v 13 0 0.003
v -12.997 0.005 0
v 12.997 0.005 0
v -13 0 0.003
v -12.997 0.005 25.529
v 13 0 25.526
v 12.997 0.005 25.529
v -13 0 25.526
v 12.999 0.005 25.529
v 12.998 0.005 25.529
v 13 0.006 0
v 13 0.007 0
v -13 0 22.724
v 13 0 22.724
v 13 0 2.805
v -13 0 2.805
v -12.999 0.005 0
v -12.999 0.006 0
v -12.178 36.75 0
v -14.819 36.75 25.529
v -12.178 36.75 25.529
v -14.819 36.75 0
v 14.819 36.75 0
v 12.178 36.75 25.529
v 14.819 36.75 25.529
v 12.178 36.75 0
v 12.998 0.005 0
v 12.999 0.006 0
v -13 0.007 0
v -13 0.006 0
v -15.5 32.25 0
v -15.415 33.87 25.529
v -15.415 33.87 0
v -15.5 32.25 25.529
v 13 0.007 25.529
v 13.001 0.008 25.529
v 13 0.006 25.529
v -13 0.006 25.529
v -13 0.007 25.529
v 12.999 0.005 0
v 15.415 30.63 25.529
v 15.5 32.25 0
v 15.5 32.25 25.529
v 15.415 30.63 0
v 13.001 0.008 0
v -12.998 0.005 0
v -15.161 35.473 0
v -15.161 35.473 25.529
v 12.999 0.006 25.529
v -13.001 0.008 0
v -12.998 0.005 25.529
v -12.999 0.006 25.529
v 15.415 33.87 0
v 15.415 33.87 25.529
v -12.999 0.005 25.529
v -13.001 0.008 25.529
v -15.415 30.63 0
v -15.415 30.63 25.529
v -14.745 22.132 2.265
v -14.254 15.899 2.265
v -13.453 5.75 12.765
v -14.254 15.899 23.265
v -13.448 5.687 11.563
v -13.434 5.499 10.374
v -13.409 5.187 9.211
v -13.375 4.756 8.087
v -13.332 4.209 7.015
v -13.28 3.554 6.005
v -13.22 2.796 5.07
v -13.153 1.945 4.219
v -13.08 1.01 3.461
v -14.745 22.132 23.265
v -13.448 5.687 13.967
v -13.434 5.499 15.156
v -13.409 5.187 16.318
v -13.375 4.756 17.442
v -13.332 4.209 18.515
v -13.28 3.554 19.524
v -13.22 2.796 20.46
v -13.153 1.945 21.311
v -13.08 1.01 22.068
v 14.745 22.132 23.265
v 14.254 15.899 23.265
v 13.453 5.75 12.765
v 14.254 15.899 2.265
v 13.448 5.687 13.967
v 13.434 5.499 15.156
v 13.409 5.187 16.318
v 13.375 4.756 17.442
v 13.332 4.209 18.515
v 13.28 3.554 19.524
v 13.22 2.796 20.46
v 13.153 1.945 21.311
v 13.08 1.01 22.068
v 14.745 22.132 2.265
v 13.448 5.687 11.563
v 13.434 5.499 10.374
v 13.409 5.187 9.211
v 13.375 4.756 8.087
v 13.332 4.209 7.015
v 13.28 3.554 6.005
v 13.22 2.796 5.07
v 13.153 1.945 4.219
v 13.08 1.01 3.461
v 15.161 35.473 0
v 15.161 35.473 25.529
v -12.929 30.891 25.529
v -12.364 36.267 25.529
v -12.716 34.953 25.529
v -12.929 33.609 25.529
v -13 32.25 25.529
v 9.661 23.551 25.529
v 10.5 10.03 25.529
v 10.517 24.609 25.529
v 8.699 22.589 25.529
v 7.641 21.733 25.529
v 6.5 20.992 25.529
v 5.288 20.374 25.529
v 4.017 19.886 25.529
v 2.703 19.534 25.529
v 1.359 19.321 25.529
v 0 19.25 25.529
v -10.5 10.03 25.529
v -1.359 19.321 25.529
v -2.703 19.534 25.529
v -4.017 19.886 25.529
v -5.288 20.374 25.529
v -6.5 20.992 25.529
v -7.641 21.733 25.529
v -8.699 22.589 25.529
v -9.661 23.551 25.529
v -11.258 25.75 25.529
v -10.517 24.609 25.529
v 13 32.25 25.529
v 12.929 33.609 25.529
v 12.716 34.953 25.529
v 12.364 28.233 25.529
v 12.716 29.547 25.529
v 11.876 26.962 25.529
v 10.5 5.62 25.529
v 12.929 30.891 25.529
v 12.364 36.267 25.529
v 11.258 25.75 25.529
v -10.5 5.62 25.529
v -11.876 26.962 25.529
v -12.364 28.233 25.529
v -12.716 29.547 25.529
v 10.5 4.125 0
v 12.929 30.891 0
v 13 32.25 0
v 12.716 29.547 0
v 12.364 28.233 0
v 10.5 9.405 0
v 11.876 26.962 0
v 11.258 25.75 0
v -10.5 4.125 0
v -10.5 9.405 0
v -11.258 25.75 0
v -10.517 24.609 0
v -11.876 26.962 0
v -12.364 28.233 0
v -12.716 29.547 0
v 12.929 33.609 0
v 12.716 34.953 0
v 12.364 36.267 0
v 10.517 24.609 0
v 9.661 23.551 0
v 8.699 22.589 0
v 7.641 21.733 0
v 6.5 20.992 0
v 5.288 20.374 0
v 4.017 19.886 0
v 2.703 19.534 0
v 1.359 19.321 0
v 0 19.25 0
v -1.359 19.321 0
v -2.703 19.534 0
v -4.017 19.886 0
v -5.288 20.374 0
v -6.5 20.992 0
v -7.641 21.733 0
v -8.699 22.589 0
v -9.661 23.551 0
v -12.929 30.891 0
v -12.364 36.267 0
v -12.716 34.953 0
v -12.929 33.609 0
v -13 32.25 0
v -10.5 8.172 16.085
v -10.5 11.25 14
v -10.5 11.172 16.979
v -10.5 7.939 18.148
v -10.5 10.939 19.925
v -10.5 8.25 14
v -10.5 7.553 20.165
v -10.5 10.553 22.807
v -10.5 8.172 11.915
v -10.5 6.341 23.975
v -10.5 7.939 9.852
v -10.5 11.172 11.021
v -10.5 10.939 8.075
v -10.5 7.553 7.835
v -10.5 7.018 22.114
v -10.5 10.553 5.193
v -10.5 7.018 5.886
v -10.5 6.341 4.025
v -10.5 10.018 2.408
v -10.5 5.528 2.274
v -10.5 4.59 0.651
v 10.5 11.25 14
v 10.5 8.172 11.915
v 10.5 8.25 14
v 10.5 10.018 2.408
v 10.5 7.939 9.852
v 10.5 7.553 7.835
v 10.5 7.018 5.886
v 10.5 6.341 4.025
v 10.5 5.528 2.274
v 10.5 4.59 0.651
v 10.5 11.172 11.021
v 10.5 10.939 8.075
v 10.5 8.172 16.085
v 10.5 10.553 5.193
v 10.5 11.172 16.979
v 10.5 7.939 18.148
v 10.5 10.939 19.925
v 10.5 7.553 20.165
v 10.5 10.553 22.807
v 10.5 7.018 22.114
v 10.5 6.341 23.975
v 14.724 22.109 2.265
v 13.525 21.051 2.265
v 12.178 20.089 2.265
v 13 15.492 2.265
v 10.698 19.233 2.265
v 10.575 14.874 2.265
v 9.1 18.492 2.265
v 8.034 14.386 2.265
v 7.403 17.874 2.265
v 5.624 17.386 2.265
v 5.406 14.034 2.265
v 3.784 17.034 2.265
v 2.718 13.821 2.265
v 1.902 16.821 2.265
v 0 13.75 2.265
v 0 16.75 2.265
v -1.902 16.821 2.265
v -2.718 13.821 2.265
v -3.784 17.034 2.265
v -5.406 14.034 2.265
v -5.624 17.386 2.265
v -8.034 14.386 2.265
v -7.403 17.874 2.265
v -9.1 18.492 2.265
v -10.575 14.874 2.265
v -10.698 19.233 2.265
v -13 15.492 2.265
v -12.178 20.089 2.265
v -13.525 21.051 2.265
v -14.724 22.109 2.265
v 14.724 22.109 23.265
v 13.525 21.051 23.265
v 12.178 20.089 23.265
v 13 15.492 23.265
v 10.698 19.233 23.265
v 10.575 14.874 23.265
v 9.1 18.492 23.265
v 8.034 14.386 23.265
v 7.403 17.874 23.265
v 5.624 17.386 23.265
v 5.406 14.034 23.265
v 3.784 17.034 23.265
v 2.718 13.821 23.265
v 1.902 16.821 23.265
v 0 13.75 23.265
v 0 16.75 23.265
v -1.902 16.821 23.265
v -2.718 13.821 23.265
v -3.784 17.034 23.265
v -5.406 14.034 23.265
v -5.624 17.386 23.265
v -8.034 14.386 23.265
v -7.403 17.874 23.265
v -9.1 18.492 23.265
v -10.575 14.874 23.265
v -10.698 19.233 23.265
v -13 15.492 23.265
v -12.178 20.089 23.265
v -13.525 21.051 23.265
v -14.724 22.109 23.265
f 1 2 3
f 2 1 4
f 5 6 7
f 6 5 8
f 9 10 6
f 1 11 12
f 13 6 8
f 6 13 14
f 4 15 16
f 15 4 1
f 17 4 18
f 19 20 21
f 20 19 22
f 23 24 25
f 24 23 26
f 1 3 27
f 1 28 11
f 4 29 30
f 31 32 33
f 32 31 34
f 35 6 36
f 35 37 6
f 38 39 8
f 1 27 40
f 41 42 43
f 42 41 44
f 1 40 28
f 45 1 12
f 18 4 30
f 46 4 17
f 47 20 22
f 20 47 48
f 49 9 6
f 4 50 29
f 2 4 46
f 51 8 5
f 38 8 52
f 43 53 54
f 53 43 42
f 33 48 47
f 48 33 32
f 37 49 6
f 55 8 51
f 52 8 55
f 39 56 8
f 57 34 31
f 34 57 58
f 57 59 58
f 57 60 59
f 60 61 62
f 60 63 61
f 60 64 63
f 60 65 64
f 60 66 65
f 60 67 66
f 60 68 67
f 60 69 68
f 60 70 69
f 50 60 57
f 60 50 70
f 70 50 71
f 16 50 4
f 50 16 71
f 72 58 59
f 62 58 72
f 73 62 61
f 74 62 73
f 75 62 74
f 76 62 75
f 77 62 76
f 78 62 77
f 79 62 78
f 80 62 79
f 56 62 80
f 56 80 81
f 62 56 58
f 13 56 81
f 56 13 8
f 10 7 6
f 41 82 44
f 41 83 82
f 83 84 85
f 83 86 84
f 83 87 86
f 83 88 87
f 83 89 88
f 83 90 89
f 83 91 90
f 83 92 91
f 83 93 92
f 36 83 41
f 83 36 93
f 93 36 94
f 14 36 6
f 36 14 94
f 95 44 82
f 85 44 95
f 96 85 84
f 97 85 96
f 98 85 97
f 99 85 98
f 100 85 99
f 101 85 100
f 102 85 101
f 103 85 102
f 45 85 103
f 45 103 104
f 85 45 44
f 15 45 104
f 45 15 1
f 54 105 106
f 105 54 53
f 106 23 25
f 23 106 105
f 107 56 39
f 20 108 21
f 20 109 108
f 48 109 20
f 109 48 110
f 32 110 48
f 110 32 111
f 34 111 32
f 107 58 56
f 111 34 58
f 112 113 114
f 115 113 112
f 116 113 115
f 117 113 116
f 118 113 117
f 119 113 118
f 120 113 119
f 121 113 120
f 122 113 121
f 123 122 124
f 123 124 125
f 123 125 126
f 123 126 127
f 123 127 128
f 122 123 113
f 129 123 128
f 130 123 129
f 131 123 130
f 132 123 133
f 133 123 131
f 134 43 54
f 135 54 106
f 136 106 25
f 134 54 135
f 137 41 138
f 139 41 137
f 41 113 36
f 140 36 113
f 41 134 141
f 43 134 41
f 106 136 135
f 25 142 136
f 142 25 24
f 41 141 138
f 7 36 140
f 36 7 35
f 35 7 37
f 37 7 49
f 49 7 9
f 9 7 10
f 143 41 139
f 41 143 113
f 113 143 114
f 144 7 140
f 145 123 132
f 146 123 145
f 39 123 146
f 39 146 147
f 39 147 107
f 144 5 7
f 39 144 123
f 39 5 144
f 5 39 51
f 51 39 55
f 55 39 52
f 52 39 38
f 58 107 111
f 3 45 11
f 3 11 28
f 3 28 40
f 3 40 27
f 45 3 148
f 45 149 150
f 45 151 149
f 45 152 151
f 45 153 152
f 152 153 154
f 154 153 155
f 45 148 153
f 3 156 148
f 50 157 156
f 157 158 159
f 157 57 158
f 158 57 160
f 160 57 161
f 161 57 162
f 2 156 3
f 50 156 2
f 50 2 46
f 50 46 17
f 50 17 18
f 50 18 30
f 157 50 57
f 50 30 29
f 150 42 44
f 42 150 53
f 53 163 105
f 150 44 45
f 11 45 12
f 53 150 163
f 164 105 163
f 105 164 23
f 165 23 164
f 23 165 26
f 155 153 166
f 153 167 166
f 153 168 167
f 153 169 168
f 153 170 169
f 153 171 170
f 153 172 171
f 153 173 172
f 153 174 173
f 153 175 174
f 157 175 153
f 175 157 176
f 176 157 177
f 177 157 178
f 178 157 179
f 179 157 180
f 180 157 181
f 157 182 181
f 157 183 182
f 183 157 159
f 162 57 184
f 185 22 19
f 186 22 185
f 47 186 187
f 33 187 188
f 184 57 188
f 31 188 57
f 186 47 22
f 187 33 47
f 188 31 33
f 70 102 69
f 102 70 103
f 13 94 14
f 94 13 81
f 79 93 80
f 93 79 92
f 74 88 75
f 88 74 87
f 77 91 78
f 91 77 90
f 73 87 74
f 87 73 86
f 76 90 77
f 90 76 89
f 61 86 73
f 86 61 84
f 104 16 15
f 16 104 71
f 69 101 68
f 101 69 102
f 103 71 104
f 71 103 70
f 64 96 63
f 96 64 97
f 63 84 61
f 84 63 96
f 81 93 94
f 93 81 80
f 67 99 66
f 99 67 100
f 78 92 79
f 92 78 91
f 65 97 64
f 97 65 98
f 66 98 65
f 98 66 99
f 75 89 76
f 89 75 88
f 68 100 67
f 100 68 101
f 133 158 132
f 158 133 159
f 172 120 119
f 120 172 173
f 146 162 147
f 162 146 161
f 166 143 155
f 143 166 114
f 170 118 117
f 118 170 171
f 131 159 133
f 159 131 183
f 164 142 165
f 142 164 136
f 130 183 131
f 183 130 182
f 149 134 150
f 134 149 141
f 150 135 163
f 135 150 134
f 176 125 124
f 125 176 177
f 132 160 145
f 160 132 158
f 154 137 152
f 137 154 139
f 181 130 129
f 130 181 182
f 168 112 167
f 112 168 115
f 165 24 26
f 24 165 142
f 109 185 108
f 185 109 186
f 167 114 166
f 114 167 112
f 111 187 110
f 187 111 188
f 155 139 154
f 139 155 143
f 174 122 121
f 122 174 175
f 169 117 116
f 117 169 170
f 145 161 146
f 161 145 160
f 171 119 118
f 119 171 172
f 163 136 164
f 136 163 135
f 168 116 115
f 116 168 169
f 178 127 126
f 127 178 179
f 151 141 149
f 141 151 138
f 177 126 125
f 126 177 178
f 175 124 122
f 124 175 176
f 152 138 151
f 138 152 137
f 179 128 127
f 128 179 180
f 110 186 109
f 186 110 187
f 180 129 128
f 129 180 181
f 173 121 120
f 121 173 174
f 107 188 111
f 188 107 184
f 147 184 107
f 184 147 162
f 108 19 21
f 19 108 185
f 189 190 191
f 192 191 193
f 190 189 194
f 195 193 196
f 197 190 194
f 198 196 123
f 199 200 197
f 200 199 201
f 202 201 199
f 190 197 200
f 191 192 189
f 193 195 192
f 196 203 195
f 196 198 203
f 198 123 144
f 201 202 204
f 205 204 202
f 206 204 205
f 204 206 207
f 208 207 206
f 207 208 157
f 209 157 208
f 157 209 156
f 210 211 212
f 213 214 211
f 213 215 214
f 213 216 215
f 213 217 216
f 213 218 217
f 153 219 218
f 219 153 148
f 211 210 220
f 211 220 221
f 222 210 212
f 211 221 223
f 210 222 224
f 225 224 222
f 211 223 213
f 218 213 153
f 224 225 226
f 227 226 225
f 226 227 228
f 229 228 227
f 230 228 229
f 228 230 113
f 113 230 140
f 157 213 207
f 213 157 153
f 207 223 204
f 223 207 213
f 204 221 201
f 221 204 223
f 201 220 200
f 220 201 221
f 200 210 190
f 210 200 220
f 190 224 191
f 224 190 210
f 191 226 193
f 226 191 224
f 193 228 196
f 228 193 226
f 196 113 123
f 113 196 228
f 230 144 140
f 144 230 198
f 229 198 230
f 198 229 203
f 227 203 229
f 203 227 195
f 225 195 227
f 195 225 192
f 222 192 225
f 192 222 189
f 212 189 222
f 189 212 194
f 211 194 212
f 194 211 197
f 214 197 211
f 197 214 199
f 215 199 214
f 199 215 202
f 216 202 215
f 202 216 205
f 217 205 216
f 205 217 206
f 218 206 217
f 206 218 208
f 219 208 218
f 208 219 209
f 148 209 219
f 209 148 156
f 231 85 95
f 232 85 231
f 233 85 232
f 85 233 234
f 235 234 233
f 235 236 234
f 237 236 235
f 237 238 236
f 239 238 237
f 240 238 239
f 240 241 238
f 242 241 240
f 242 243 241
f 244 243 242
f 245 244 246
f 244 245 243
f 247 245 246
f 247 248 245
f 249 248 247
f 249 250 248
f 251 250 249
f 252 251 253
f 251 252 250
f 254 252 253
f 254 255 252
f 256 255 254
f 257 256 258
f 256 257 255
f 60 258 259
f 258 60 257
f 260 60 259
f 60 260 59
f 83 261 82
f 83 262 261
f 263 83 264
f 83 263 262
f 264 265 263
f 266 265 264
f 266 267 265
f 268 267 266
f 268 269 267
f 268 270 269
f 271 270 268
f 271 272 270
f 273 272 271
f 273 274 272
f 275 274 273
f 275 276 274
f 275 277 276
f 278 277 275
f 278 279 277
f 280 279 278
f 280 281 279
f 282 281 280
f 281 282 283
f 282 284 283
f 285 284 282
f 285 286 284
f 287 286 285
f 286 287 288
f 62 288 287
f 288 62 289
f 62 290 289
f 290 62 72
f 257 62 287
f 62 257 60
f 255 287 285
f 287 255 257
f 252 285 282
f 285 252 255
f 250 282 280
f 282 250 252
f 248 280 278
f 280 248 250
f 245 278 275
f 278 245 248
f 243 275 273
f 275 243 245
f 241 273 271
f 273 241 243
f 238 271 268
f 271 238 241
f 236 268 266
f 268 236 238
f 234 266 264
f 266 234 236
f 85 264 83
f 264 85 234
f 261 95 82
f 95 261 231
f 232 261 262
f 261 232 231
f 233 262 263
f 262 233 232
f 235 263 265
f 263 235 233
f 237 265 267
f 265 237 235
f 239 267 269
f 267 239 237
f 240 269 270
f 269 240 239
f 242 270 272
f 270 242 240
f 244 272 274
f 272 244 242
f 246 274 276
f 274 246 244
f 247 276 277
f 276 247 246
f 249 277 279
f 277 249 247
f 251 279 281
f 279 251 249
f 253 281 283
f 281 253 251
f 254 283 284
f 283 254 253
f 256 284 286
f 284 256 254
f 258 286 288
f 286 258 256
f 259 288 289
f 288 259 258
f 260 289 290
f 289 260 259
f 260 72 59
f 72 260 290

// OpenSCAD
/**** Settings ****/

handlebar_diameter = 23;
light_diameter = 26;

// The width of the handlebar mount
width = 26;

// The thickness of the walls (e.g. between the mounting brackets and the strap tunnels)
wall = 2.5;

// The amount of "snap" for the flashlight mount
snap = 4.5;

// Any extra height you want to add between the two strap tunnels
extra_height = 0;

// Angle the flashlight snap mount to compensate for an angle in your handlebars
light_angle = 0;

// Set this to the thickness of your straps, plus some wiggle room
strap_gap = 3;

// Set this to the width of your straps, plus some wiggle room
strap_width = 21;

quality = 2; // [1:5]


/**** Computed values ****/

/*
Notes:

The thing is made lying down. In the settings, "height" means y and "width" means x.
In the computed values, "height" means z, whereas y is called "length".

The handlebar mount is half a radius high. `block_height` is a simple `a^2 + b^2 = c^2`,
`a` being the unknown (the cross section of the circle at half a radius from the top)
*/

hb_r = handlebar_diameter / 2;
light_r = light_diameter / 2;

block_average_width = (width + light_diameter + 2*wall) / 2;
block_length = hb_r/2 + 3*wall + 2*strap_gap + extra_height + light_r + snap;
block_height = 2 * sqrt(pow(hb_r + wall, 2) - pow(hb_r / 2, 2));

$fn = quality * 30;


/**** Code! :D ****/

mount();

module mount() {
  difference() {
    body();
    handlebar_strap();
    light_strap();
  }
}

module body() {
  difference() {
    trimmed_body_hull();
    handlebar(extra=0, width=2*width);
    light(extra=0);
  }
}

module trimmed_body_hull() {
  difference() {
    body_hull();
    body_trim(1);
    body_trim(-1);
  }
}

module body_hull() {
  hull() {
    handlebar(extra=wall, width=width);
    light(extra=wall);
  }
}

module body_trim(direction=1) {
  translate([-block_average_width, 0, direction * block_height])
    cube([block_average_width*2, block_length, block_height]);
}

module handlebar(extra, width) {
  translate([-width/2, 0, block_height / 2])
    rotate([0, 90, 0])
    linear_extrude(height=width)
    handlebar2D(wall=extra);
}

module light(extra) {
  rotate([0, light_angle, 0])
    translate([0, block_length - snap, -block_height/2])
    linear_extrude(height=block_height*2)
    light2D(wall=extra);
}

module handlebar2D(wall=0) {
  difference() {
    translate([0, -hb_r/2])
      circle(r=hb_r + wall);
    translate([-handlebar_diameter, -handlebar_diameter])
      square([2*handlebar_diameter, handlebar_diameter]);
  }
}

module light2D(wall=0) {
  difference() {
    circle(r=light_r + wall);
    translate([-light_diameter, snap])
      square([2*light_diameter, 2*light_diameter]);
  }
}

module handlebar_strap() {
  translate([-strap_width/2, hb_r/2 + wall, hb_r + wall])
    rotate([0, 90, 0])
    linear_extrude(height=strap_width, convexity=2)
    strap_slot2D(block_average_width);
}

module light_strap() {
  translate([0, block_length - snap - light_r - wall, strap_width/2 + (block_height - strap_width)/2])
    rotate([0, -light_angle, 180])
    translate([0, 0, -strap_width/2])
    linear_extrude(height=strap_width, convexity=2)
    strap_slot2D(light_diameter);
}

module strap_slot2D(width) {
  translate([0, strap_gap - width/2])
  difference() {
    scale([1, 0.5])
    circle(r=width);
    translate([0, -strap_gap])
      scale([0.7, 0.5])
      circle(r=width);
    translate([-width, -width])
      square([2*width, width]);
  }
}
